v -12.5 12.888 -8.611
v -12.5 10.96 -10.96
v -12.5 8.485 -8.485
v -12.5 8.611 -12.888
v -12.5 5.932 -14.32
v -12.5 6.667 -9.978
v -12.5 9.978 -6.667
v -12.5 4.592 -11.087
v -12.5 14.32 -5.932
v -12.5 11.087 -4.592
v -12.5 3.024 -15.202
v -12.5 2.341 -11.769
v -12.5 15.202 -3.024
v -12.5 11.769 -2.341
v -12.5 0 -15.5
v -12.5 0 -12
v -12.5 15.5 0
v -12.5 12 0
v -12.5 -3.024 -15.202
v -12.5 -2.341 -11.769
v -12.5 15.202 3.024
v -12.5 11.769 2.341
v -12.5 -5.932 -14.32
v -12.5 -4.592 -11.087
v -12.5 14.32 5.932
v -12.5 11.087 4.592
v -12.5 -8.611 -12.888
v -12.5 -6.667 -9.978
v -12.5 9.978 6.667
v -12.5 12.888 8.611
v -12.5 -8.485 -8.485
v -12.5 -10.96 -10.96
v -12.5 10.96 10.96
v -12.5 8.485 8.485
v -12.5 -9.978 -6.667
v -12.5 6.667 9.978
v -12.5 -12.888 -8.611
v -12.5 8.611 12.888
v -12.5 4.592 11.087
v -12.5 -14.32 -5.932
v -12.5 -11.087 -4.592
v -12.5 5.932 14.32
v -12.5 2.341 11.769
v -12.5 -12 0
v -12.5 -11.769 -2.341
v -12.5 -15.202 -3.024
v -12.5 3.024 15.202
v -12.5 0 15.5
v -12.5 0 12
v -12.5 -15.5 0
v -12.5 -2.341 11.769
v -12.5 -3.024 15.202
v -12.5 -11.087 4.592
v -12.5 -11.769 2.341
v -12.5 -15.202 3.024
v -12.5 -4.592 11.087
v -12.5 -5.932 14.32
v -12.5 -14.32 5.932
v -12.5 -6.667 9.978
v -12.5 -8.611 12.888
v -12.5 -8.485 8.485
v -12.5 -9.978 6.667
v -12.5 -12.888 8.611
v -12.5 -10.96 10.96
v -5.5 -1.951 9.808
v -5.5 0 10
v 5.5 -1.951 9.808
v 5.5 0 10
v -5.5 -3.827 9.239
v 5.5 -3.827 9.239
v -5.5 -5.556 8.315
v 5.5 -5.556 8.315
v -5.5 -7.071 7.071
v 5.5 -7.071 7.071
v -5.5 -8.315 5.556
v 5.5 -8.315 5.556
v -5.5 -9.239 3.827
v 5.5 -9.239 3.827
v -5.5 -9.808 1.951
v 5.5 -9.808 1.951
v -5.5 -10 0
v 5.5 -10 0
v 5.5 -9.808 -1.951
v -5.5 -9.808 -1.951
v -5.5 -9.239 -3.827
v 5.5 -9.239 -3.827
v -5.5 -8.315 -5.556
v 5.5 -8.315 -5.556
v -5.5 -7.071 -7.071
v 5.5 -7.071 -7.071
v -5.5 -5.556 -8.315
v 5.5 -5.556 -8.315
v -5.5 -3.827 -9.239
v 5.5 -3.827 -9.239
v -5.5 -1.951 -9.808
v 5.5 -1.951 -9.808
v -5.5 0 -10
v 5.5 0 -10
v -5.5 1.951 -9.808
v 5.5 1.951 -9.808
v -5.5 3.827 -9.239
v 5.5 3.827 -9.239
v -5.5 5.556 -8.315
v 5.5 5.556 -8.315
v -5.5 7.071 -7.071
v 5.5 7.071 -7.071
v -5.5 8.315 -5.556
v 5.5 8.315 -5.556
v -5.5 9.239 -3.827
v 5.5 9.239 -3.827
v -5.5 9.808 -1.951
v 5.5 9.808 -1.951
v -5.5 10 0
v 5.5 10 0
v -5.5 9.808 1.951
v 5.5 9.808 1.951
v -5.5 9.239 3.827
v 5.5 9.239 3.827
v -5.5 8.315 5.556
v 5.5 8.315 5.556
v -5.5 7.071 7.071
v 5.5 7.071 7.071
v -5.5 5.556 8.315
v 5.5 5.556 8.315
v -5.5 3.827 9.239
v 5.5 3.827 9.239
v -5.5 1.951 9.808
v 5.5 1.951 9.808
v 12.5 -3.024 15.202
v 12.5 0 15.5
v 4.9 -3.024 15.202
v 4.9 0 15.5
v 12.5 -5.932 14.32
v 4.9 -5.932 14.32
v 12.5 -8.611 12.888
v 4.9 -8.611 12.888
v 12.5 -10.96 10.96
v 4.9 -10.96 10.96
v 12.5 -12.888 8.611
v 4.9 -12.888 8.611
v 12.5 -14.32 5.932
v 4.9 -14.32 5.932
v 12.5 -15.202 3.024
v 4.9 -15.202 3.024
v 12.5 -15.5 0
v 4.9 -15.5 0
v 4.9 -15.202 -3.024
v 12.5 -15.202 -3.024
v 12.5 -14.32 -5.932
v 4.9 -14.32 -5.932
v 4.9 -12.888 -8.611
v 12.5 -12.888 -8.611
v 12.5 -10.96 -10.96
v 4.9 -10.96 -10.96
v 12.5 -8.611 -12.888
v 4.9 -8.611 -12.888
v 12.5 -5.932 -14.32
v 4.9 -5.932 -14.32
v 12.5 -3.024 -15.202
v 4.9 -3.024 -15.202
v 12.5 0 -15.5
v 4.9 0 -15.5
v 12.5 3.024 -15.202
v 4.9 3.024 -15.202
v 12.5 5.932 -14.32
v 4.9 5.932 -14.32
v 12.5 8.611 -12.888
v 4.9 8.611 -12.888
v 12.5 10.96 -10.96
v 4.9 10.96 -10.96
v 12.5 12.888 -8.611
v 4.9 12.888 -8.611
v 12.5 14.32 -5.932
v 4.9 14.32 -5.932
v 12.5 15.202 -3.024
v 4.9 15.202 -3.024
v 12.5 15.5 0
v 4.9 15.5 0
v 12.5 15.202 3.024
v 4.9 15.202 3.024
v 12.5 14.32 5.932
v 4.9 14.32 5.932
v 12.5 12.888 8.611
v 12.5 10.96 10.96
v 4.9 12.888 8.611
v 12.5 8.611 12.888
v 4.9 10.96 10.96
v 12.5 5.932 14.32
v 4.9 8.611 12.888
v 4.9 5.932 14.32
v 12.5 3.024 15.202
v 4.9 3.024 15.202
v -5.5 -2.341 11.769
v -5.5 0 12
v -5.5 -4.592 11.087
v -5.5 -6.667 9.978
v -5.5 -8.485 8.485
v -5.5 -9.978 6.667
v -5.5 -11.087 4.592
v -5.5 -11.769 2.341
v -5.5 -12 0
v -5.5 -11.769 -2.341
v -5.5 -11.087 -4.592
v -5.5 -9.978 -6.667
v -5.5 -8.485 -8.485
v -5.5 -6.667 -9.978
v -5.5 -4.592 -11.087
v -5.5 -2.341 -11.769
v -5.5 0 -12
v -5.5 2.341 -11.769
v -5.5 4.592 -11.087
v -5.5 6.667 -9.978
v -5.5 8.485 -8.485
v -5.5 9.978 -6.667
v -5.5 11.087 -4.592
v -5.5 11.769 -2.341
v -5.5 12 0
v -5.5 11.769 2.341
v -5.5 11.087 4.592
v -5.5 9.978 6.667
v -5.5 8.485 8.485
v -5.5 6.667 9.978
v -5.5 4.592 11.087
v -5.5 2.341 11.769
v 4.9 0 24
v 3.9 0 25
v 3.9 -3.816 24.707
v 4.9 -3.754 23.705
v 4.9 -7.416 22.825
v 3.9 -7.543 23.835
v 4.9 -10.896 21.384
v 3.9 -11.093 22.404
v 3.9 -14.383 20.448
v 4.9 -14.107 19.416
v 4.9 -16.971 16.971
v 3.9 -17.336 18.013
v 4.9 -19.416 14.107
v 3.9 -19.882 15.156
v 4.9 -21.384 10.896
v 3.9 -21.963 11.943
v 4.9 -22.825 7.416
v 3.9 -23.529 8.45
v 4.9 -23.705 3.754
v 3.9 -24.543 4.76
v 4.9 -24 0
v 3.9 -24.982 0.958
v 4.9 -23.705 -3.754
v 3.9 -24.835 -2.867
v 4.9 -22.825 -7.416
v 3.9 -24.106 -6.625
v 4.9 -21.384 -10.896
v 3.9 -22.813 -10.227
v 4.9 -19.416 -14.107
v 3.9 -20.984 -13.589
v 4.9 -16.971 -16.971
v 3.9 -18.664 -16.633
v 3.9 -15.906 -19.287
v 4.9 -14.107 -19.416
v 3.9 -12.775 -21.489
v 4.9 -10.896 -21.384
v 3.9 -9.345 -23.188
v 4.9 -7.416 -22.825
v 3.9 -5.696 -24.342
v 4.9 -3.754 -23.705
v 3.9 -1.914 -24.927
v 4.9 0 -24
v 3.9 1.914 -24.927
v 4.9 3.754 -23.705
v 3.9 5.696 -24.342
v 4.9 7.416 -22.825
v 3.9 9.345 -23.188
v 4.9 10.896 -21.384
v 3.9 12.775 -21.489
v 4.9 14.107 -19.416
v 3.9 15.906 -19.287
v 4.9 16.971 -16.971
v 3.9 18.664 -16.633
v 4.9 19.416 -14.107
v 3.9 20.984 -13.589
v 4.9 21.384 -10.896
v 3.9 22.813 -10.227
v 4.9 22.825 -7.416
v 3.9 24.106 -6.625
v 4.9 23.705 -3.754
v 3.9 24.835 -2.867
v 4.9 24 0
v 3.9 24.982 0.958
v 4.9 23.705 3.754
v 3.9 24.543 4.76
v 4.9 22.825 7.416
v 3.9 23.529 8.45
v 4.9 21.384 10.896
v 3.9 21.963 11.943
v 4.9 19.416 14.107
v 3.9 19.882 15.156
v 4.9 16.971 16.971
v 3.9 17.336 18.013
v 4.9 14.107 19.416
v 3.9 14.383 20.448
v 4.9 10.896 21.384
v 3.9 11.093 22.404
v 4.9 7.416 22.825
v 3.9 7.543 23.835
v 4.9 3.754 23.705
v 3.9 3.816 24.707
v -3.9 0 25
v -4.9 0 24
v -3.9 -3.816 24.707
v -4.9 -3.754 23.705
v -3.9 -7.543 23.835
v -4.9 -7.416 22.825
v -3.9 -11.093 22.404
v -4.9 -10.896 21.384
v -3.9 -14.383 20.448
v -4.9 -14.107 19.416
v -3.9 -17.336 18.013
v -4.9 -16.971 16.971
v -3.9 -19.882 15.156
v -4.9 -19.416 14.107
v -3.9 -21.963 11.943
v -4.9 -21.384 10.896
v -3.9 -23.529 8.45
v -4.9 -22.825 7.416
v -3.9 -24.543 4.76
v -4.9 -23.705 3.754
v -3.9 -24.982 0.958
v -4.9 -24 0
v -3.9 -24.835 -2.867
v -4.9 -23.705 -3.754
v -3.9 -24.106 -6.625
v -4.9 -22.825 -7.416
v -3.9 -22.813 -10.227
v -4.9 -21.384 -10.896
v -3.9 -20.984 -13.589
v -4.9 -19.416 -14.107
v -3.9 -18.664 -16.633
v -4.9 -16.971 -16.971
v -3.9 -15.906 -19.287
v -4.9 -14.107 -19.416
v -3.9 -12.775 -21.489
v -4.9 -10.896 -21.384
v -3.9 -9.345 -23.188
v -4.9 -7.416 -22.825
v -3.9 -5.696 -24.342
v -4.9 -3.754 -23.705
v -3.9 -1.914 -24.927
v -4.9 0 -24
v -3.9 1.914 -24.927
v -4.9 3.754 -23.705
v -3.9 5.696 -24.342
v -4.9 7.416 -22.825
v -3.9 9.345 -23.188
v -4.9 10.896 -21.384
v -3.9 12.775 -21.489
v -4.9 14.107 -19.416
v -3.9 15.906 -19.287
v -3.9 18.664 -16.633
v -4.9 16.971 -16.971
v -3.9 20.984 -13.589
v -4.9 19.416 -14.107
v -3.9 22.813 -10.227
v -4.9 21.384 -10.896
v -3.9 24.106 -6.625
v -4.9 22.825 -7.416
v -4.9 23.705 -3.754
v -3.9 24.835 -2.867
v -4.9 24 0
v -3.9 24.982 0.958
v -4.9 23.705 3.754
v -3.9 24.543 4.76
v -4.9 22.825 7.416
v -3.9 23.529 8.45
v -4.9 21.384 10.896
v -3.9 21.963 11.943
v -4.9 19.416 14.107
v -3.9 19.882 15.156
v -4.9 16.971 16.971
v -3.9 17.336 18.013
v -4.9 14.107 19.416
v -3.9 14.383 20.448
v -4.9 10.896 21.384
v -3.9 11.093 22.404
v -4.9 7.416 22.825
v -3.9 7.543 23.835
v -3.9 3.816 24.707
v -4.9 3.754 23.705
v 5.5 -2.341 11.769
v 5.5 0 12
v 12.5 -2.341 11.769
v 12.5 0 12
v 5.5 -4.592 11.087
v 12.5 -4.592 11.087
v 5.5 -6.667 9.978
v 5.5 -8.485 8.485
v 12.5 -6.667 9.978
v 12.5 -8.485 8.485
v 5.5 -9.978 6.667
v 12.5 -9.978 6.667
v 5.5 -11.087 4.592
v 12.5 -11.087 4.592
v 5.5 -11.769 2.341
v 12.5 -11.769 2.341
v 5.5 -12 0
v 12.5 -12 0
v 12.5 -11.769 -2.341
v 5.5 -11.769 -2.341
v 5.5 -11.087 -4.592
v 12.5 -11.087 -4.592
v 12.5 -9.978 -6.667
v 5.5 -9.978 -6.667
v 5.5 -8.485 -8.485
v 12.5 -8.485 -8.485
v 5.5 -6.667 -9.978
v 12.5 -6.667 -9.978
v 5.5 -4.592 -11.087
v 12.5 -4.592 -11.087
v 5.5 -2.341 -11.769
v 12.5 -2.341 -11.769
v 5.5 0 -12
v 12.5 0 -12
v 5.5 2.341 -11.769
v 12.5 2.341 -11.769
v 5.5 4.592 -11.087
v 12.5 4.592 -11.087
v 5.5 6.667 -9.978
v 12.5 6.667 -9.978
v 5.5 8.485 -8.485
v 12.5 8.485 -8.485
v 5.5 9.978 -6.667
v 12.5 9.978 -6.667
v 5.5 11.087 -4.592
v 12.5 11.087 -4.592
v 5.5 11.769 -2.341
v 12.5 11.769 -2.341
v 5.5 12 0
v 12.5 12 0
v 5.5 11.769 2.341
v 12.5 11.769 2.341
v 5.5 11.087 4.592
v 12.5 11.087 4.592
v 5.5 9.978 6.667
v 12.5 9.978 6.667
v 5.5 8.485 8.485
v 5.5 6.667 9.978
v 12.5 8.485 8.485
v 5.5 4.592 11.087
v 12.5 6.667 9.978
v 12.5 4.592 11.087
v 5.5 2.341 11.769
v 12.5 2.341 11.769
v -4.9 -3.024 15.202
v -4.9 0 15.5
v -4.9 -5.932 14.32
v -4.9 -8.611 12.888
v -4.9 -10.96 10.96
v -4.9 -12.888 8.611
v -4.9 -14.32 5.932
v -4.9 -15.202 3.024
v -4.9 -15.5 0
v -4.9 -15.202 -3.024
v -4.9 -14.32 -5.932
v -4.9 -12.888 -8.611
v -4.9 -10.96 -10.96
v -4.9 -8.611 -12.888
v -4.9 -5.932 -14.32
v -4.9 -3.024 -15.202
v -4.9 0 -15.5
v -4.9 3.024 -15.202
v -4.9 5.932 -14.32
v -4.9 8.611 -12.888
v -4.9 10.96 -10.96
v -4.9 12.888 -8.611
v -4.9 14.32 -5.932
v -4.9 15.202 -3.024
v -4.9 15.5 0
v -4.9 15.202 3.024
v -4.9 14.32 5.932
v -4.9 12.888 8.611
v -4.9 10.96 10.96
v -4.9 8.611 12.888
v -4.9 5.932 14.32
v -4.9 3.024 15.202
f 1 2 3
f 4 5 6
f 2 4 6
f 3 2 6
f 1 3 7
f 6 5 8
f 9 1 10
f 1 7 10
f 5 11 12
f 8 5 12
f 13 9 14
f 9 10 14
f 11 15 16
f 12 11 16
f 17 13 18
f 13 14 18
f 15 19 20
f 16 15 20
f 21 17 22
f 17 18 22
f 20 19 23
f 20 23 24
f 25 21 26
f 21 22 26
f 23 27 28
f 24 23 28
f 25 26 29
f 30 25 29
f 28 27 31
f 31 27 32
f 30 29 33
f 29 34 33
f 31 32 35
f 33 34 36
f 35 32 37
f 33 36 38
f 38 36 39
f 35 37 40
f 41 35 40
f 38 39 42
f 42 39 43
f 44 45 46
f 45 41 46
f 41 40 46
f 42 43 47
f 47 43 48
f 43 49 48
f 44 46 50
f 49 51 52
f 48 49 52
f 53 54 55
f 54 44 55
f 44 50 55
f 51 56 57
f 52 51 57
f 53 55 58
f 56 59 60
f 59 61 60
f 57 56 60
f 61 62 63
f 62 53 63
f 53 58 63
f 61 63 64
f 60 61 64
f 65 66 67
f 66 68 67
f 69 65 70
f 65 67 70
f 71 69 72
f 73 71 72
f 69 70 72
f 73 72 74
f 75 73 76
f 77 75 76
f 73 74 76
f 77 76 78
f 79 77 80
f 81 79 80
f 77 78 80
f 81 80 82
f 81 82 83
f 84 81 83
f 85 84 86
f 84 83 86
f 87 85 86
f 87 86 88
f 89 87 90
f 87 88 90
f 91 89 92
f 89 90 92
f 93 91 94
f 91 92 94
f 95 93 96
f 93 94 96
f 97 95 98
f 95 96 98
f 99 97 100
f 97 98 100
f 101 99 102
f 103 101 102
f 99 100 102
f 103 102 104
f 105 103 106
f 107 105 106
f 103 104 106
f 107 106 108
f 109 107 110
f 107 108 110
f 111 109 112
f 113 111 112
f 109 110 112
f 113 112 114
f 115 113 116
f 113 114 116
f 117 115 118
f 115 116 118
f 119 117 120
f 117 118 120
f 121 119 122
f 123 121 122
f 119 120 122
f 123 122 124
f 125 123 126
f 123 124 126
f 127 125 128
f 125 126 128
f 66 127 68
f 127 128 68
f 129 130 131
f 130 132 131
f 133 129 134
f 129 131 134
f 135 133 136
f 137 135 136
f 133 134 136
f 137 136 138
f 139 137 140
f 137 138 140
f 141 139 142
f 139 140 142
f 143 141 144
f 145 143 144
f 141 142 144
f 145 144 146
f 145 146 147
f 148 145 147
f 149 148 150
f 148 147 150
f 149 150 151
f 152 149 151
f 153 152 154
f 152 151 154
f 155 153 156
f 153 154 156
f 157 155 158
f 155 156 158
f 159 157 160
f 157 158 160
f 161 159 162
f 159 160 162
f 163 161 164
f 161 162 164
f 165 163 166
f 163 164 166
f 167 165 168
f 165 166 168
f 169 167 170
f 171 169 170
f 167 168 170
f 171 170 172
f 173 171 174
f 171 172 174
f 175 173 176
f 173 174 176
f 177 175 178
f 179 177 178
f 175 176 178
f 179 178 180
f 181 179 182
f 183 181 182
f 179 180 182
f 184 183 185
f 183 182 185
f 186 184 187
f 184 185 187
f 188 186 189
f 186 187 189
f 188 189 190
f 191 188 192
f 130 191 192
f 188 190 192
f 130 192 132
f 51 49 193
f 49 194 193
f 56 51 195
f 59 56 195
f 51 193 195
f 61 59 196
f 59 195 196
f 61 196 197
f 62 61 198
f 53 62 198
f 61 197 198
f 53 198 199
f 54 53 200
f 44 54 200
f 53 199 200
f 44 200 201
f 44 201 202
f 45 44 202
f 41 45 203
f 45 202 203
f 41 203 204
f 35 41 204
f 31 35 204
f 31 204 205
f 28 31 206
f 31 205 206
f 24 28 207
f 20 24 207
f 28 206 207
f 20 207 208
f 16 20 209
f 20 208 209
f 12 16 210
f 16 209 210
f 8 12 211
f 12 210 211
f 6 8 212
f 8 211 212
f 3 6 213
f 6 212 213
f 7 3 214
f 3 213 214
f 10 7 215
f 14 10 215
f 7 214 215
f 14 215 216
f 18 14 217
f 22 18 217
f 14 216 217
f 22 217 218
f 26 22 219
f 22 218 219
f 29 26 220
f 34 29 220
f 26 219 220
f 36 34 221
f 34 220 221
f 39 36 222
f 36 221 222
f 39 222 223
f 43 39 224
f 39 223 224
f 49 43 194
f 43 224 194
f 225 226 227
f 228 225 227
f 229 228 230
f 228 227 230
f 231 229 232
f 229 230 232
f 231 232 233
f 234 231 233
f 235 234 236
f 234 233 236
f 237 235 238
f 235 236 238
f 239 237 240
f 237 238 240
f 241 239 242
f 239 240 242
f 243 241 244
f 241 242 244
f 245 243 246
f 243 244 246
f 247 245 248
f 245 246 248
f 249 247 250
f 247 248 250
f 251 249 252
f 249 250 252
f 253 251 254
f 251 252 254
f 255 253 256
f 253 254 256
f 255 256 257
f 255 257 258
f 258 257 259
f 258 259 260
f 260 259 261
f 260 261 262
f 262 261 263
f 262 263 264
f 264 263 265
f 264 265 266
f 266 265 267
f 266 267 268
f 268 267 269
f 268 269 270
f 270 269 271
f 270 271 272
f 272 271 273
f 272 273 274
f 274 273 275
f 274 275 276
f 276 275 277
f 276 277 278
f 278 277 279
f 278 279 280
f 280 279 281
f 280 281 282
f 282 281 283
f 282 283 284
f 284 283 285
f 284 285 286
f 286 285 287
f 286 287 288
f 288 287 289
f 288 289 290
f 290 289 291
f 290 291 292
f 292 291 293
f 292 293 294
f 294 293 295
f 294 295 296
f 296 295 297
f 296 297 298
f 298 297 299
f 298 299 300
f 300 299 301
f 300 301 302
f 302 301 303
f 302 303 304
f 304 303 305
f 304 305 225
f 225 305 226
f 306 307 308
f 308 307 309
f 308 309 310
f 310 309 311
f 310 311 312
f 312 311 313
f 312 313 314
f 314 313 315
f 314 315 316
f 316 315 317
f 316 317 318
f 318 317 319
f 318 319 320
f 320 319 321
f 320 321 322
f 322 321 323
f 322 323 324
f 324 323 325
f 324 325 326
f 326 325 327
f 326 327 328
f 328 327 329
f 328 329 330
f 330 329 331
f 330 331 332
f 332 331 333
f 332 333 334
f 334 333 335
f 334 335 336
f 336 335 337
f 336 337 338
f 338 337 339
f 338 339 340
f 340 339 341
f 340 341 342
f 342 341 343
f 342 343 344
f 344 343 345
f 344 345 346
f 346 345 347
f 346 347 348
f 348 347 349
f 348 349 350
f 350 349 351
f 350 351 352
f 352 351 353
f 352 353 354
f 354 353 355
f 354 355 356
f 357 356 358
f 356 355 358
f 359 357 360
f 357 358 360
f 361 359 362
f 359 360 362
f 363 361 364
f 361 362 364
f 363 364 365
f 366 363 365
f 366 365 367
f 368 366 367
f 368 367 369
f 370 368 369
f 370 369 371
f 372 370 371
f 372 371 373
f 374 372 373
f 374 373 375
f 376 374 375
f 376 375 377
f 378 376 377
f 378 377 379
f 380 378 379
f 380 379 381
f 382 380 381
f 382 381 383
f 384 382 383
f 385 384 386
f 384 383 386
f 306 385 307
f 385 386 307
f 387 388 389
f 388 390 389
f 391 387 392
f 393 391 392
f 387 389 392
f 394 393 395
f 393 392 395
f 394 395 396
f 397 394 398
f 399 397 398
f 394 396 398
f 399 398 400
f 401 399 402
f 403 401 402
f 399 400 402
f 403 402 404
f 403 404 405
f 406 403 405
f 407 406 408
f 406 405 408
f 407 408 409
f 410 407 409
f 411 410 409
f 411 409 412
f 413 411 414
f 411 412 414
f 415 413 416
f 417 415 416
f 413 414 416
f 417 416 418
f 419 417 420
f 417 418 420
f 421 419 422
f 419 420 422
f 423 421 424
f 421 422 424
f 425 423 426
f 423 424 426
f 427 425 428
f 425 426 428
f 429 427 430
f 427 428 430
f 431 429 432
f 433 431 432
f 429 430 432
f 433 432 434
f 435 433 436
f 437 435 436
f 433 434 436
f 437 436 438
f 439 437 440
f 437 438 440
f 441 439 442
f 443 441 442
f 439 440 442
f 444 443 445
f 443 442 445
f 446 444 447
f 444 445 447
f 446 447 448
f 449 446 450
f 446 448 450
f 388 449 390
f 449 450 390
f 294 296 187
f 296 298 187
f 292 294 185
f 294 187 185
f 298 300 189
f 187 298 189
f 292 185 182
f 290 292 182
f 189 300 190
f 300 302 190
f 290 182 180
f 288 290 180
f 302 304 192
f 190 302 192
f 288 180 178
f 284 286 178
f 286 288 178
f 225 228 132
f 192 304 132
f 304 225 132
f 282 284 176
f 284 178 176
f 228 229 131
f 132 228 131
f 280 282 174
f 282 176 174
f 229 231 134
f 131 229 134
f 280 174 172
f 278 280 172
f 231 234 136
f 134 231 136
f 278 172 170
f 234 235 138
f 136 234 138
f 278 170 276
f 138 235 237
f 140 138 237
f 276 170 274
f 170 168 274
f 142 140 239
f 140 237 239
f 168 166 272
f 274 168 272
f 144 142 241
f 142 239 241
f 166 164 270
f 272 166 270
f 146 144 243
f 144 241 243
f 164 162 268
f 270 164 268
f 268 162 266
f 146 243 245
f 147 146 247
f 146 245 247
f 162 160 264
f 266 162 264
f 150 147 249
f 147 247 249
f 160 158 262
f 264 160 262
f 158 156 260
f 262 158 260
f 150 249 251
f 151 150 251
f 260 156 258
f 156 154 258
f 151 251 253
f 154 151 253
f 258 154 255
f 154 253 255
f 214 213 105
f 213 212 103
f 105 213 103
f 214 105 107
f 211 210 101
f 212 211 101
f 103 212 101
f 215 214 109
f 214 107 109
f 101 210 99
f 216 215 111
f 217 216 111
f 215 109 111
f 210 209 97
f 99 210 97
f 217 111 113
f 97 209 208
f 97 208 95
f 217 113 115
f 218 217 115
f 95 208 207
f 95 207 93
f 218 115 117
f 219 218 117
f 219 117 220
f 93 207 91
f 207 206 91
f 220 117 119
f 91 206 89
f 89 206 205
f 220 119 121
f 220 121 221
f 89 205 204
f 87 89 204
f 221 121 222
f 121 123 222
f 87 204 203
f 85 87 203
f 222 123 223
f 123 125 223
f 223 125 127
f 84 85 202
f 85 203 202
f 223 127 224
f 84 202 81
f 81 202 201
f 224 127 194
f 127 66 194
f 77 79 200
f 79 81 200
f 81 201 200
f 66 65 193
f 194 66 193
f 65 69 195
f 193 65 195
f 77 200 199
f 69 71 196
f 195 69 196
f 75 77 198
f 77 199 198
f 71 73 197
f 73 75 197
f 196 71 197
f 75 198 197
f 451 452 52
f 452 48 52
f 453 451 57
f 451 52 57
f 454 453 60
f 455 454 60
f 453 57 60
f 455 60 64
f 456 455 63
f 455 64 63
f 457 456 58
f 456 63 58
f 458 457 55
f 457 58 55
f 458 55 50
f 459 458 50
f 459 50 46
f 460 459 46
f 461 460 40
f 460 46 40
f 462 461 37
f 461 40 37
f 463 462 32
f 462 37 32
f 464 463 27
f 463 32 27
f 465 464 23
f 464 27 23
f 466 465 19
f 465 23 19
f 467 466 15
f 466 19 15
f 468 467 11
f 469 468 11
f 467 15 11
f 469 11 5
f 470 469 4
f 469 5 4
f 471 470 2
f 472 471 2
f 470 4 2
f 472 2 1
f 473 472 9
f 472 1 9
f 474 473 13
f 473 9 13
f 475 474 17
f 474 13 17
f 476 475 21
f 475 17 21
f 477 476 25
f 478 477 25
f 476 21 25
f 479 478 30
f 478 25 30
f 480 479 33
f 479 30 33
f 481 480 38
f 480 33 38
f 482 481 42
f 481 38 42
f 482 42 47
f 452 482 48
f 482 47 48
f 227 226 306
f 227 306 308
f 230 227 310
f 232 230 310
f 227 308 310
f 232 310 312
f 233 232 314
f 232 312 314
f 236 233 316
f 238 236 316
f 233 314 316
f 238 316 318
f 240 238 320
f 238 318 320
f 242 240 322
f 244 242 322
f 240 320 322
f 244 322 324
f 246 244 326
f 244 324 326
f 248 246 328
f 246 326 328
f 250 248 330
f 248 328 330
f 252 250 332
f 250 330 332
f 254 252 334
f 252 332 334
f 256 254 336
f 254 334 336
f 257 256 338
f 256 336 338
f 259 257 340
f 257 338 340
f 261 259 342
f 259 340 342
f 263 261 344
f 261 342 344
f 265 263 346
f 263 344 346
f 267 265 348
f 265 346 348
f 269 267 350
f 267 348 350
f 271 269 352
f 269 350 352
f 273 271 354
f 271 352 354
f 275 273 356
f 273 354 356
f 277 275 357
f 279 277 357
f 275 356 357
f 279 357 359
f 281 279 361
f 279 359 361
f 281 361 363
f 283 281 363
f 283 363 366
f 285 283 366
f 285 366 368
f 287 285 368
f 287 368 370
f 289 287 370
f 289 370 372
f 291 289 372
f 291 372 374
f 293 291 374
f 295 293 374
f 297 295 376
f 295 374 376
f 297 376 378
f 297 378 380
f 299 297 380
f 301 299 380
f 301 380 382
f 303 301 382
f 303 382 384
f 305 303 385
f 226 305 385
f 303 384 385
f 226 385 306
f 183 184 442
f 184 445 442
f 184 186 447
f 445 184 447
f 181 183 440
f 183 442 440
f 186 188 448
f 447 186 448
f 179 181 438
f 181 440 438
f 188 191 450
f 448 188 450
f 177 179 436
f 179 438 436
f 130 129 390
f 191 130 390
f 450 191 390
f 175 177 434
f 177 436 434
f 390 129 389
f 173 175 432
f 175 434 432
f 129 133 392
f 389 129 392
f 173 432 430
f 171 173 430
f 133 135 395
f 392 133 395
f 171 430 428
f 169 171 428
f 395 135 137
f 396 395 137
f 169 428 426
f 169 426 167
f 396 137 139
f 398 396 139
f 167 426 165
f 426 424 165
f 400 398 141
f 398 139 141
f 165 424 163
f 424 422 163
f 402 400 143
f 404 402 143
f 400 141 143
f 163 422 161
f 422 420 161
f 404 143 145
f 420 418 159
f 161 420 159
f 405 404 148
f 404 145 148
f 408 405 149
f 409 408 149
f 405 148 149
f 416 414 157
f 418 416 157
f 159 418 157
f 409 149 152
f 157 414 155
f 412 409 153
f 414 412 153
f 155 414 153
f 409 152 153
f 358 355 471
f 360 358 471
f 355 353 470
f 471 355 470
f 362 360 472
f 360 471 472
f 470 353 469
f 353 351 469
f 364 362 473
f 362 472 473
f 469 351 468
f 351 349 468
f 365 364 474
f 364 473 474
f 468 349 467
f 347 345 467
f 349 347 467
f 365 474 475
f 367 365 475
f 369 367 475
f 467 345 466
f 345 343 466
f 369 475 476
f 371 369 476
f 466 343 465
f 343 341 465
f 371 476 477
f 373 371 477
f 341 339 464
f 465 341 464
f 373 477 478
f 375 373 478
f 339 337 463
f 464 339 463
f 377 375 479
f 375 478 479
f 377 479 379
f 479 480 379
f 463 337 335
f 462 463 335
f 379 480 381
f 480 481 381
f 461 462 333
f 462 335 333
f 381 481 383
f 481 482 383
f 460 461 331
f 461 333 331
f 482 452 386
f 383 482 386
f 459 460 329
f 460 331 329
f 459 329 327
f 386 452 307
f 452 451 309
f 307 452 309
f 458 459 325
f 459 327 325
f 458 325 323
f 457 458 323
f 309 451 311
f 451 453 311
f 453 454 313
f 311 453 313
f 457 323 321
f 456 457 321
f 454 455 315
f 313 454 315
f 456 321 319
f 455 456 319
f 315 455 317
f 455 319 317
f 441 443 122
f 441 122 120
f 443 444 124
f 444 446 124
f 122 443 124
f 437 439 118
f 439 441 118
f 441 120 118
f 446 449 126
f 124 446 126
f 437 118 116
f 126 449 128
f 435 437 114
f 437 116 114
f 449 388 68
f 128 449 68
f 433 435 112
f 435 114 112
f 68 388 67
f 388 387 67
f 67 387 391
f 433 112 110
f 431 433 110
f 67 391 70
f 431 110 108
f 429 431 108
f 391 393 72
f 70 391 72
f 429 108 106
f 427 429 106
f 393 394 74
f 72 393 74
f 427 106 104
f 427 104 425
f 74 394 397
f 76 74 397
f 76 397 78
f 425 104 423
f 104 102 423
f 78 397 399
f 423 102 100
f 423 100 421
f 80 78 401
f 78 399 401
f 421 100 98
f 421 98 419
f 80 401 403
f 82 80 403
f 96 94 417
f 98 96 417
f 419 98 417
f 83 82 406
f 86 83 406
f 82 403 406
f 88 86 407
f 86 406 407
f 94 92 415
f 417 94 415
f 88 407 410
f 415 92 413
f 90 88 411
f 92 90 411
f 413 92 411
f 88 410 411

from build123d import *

# Parameters (mm, degrees)
CHAMFER_1_SIZE = 1


with BuildPart() as part:
    # Эскиз1 → Повернуть1 (revolve)
    with BuildSketch(Plane.XY, mode=Mode.PRIVATE) as revolve_1_sk:
        Polygon((-5.5, 10), (5.5, 10), (5.5, 12), (12.5, 12), (12.5, 15.5), (4.9, 15.5), (4.9, 25), (-4.9, 25), (-4.9, 15.5), (-12.5, 15.5), (-12.5, 12), (-5.5, 12), align=None)
    revolve(revolve_1_sk.sketch.rotate(Axis((-24.618848289, 0, 0), (1, 0, 0)), 90), axis=Axis((-24.618848289, 0, 0), (1, 0, 0)))  # turned: the seam where the file's is

    # Фаска1
    chamfer_1_edges = [part.edges().sort_by_distance(p)[0] for p in [
        (-4.9, 0, -25),
        (4.9, 0, -25),
    ]]
    chamfer(chamfer_1_edges, length=CHAMFER_1_SIZE)


solid = part.part
